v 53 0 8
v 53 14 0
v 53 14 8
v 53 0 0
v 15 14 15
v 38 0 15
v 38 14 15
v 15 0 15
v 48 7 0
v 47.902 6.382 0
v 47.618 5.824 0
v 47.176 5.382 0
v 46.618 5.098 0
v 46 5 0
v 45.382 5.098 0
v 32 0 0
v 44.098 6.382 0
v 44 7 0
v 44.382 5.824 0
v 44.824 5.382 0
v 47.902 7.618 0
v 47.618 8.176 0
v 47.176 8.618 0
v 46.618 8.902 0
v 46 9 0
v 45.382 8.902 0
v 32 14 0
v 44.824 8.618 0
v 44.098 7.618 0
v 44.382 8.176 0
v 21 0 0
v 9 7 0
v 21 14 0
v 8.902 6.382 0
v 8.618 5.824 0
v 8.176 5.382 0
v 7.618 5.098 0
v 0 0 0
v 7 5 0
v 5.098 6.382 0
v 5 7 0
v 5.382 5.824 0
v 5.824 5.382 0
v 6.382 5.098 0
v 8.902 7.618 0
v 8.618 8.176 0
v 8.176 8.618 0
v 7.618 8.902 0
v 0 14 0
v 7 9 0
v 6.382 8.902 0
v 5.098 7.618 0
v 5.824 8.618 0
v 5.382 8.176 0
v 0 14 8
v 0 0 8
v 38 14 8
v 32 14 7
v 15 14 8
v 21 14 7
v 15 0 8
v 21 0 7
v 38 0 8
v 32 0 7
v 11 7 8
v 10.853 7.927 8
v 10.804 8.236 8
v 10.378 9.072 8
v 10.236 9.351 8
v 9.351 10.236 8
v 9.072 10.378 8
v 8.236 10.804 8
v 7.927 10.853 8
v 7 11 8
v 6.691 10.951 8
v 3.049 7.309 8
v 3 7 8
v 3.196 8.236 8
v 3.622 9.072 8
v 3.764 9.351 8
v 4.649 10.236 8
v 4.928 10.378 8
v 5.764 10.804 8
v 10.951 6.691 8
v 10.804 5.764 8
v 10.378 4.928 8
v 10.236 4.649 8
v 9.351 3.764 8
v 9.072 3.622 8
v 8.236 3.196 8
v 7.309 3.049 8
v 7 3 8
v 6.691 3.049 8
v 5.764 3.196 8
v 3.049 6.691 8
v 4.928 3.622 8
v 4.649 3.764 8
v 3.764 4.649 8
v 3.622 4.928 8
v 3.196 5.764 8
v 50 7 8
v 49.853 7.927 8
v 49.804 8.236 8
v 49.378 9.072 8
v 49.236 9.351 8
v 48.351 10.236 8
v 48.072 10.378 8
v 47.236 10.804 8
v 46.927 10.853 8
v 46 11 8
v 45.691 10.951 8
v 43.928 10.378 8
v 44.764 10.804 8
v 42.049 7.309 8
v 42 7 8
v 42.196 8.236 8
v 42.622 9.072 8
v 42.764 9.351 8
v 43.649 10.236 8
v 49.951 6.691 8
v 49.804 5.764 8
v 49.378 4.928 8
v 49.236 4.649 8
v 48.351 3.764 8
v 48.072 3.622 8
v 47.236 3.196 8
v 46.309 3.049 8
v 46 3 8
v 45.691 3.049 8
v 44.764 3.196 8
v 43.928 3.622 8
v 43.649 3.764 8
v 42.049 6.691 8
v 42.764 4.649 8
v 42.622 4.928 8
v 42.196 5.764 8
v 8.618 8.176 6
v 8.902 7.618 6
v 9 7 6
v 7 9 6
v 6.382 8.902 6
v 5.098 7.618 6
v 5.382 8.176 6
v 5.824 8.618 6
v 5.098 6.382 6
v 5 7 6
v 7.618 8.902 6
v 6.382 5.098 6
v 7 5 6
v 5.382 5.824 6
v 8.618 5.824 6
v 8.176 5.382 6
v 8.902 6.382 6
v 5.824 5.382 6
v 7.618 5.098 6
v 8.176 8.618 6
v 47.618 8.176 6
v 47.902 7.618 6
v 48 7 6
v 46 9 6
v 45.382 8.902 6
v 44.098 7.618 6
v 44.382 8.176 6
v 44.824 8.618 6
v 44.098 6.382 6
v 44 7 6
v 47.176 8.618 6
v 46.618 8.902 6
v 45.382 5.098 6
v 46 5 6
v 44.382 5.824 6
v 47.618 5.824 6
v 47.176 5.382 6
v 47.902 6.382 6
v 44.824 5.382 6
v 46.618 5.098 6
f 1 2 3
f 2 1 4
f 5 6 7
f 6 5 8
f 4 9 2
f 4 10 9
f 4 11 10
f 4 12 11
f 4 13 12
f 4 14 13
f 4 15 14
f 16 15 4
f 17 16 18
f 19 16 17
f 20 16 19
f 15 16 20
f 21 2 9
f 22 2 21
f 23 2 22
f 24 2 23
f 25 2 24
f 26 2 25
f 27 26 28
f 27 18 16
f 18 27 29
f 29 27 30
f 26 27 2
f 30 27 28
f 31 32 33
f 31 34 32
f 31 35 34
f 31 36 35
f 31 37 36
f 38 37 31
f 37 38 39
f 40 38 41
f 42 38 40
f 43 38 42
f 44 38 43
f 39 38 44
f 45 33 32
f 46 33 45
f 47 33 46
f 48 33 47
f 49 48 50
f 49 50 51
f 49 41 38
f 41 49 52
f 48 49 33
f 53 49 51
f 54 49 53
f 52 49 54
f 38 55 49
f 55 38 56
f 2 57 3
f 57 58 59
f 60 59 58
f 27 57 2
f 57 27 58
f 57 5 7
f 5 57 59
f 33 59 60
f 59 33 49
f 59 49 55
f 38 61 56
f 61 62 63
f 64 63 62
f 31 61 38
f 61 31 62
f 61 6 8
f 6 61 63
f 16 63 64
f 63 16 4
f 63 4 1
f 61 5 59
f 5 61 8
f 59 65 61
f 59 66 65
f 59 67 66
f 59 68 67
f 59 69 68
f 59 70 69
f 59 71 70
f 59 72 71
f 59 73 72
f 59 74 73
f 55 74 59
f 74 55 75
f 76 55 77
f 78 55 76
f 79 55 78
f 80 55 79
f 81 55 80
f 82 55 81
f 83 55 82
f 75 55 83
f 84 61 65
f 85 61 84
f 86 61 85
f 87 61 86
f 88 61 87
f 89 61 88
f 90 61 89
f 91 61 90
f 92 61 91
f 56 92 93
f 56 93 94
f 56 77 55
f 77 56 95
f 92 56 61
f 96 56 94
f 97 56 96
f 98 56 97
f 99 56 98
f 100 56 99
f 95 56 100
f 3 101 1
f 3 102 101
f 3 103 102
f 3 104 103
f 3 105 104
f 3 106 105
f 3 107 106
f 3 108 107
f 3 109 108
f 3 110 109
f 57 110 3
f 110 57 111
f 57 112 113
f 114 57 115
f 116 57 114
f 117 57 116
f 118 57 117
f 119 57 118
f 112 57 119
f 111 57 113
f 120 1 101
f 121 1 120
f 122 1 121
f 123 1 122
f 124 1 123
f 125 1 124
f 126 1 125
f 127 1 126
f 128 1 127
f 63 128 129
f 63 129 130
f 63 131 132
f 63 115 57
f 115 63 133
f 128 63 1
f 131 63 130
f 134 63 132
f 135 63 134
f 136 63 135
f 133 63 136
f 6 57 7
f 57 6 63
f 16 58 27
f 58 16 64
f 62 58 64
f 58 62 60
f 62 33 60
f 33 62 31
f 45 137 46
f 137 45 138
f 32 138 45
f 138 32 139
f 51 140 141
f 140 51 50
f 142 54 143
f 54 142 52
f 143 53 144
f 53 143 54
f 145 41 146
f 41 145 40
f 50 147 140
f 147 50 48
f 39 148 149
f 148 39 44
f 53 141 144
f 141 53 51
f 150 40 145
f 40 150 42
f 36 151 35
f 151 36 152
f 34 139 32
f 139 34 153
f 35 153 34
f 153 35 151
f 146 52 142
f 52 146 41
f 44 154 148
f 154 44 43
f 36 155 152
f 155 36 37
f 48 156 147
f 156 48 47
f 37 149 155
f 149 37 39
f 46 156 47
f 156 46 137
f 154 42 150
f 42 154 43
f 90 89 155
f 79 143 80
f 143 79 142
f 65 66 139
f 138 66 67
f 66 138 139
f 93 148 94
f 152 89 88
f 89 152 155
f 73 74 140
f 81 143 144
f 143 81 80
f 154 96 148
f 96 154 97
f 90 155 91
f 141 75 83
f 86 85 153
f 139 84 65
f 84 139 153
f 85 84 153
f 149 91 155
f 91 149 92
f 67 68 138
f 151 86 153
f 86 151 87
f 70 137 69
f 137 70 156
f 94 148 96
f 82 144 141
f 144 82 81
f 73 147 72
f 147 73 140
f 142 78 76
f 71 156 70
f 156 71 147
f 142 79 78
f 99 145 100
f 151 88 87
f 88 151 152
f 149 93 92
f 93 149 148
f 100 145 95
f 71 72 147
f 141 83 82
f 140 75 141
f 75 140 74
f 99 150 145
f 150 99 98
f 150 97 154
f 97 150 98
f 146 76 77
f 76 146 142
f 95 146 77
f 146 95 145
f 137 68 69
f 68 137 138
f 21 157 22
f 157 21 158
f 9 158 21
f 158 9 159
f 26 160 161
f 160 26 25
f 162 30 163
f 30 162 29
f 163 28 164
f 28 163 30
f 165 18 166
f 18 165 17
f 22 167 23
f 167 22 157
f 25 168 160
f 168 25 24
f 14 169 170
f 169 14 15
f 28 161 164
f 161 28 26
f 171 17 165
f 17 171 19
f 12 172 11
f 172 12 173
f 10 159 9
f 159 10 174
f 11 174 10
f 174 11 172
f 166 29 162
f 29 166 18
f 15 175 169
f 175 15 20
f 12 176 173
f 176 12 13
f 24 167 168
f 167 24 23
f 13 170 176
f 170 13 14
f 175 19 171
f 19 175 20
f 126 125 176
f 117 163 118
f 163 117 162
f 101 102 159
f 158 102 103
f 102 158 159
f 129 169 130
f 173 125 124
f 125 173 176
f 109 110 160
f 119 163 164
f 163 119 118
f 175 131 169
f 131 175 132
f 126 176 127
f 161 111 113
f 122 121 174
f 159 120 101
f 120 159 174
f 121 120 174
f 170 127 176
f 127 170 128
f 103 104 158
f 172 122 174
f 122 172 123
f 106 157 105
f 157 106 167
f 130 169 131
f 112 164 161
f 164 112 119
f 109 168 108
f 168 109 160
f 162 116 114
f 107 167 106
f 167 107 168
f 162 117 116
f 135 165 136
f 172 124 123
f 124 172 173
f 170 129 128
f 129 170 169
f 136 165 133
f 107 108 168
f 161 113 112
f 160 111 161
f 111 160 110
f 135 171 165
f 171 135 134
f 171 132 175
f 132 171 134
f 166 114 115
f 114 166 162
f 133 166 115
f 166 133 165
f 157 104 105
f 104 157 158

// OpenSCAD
difference() { 
cube ([53,14,15]);
	translate ([0, 0, 8]) cube (size = [15, 14, 7]);
	translate ([0, 0, 8]) cube (size = [15, 14, 7]);
	translate ([38, 0, 8]) cube (size = [15, 14, 7]);
	translate ([21, 0, 0 ]) cube (size = [11, 14, 7]);
	translate ([7, 7, 0]) cylinder (h = 8, d = 4, $fn = 20);
	translate ([7, 7, 8]) cylinder (h = 4, r1 = 2, r2 = 6, center = true, $fn = 20);
	translate ([46, 7, 0]) cylinder (h = 8, d = 4, $fn = 20);
	translate ([46, 7, 8]) cylinder (h = 4, r1 = 2, r2 = 6, center = true, $fn = 20);
}
